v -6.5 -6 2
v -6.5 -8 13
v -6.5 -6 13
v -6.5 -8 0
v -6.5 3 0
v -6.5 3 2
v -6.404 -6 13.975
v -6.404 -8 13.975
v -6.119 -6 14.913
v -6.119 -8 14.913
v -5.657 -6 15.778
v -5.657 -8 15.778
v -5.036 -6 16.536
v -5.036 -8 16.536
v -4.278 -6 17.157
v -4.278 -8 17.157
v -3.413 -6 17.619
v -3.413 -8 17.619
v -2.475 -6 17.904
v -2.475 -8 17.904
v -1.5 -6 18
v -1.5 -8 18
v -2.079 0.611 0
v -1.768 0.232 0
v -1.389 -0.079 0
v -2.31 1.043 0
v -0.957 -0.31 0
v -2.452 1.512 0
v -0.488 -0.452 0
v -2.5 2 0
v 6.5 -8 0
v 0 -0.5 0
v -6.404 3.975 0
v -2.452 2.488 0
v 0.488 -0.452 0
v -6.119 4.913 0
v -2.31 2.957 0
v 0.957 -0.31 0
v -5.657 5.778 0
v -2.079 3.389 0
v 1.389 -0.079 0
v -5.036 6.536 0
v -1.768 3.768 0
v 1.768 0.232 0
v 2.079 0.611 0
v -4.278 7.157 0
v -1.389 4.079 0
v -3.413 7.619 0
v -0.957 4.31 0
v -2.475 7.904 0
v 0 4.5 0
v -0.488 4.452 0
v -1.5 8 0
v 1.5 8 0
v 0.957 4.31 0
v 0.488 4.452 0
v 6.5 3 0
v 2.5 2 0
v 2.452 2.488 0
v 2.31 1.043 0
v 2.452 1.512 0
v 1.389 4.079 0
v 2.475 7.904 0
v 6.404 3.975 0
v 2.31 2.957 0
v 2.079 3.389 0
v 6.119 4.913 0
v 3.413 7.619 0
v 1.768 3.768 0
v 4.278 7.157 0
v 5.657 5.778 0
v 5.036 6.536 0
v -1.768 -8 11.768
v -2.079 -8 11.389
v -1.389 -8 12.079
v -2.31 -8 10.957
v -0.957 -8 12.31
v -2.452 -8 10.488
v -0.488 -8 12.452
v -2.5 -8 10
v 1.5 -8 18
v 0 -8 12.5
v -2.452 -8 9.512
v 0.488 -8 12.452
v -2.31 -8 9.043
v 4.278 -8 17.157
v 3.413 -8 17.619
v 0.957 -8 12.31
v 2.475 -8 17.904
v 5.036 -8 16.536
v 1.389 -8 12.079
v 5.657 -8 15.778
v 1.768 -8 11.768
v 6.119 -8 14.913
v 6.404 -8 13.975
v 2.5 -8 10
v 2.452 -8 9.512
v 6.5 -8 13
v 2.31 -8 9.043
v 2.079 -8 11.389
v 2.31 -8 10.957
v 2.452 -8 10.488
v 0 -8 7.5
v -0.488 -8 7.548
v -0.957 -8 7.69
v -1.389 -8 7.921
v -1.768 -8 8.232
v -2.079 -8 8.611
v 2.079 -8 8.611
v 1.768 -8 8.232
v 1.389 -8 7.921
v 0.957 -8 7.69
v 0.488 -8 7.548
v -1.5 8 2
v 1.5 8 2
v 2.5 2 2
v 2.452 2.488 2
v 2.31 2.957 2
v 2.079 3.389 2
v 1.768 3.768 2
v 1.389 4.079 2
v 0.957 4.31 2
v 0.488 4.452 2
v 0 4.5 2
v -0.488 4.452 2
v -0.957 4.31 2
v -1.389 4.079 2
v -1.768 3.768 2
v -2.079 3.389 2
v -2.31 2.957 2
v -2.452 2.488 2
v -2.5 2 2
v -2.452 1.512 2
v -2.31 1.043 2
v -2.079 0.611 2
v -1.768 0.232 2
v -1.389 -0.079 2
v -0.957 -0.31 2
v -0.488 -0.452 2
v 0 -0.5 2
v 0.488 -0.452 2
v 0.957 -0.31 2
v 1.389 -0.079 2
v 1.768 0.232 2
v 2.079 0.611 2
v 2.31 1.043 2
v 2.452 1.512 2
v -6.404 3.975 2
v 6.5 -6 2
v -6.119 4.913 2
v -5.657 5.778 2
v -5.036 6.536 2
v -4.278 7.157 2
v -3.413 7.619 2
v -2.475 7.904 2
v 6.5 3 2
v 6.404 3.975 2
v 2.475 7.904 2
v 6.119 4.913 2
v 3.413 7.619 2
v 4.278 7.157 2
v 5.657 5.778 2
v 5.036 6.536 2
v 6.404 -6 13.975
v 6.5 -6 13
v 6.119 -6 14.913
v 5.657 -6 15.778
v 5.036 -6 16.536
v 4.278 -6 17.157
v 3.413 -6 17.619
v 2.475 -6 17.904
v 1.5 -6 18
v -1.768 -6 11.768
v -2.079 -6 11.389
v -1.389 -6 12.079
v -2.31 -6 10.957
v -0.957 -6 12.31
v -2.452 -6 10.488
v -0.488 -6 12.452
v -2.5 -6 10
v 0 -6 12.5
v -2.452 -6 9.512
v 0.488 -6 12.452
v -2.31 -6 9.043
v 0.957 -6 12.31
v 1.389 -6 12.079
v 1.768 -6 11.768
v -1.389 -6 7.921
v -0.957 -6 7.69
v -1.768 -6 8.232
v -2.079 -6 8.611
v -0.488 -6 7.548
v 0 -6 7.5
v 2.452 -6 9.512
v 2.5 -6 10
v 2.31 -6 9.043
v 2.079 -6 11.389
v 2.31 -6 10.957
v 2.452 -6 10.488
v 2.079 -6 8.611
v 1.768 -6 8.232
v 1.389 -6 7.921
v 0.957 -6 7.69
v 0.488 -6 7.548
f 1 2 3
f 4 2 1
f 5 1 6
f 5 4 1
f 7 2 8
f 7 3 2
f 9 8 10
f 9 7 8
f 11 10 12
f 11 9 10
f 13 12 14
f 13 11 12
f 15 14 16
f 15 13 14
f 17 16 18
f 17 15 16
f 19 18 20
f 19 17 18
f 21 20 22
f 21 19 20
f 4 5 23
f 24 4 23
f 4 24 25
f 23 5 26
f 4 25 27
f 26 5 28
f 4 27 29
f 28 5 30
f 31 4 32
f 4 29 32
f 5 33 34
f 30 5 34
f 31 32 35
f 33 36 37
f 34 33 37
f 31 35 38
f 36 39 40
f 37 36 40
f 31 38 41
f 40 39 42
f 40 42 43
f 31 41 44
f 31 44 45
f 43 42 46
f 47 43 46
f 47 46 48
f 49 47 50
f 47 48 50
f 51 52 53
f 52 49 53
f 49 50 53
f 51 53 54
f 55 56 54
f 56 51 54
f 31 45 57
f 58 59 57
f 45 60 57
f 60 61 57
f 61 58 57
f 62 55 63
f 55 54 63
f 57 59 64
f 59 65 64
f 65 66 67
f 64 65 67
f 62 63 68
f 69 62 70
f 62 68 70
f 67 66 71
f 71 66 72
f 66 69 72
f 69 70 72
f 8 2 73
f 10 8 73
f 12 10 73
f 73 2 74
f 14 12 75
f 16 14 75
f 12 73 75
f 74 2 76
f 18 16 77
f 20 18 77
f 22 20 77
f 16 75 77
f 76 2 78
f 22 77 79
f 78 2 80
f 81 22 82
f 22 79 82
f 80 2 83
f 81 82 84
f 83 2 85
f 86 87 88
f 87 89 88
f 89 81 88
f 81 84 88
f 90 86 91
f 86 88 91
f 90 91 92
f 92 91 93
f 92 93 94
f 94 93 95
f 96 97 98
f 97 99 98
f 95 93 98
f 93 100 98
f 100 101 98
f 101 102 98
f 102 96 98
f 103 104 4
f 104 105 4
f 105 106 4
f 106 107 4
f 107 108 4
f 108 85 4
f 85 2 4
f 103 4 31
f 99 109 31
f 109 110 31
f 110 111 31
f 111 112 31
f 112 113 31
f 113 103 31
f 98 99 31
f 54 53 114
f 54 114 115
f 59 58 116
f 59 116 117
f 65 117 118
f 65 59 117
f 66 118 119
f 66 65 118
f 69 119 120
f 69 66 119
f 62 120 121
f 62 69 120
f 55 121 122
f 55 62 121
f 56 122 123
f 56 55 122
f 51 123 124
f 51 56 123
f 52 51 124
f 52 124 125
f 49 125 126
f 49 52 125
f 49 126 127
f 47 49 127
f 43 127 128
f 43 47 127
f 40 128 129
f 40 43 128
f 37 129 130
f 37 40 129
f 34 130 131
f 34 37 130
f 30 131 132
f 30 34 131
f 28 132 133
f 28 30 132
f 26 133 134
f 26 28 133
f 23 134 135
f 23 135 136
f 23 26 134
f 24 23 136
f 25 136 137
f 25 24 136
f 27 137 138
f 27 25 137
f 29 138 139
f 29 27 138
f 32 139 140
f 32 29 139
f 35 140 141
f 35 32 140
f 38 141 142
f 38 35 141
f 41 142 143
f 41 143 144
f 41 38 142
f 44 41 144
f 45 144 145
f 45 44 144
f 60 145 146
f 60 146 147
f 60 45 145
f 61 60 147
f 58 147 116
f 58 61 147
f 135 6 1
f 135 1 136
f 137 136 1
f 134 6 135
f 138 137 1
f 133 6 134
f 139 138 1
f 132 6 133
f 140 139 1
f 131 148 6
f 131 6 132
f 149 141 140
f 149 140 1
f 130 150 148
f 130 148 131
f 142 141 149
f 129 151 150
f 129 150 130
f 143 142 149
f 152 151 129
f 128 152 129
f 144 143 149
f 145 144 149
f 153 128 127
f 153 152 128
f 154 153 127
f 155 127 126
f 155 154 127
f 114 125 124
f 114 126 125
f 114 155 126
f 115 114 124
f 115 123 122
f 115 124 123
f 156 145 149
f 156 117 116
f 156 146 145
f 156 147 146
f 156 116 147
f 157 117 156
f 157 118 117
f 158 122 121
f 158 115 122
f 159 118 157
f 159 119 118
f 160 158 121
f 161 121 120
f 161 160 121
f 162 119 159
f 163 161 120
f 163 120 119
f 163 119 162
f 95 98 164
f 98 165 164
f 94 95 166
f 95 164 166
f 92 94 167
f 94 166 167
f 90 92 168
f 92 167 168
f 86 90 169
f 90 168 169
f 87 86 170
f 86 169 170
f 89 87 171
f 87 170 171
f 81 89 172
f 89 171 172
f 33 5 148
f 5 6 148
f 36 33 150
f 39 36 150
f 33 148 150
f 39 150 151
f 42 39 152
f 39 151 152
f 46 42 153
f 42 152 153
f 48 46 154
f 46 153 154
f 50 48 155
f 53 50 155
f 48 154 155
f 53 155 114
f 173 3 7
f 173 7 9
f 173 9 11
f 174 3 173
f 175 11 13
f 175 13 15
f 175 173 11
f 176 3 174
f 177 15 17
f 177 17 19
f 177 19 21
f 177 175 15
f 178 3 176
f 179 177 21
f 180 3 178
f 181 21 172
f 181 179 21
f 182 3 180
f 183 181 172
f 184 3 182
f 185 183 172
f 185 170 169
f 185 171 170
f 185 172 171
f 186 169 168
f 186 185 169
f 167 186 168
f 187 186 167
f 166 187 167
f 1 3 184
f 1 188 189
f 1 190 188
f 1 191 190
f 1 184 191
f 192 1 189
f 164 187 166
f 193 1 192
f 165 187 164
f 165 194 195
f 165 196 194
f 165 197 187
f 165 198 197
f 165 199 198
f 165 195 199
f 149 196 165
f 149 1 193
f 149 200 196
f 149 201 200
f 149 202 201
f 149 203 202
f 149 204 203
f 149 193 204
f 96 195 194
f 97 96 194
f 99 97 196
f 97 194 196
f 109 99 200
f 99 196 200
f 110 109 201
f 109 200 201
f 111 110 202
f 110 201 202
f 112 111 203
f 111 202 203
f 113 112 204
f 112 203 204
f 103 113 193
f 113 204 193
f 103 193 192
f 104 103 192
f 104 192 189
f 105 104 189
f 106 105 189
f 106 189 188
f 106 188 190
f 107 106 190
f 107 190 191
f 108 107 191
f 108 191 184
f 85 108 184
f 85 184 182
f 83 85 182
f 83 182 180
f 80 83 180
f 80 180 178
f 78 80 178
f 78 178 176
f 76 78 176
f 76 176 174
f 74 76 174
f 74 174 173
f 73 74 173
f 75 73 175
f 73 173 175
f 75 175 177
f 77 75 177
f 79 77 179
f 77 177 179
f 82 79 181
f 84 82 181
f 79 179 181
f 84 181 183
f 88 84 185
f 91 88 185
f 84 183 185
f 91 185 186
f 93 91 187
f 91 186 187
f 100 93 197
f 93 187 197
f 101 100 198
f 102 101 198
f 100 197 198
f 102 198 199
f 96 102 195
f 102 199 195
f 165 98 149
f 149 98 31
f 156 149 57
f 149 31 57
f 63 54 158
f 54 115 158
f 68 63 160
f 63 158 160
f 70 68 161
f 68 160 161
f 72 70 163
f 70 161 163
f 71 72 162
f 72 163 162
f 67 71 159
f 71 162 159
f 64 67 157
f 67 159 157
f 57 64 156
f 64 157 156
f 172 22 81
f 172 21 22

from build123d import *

# Parameters (mm, degrees)
SKETCH1_W           = 13
SKETCH1_H           = 16
SKETCH1_R           = 2.5
BOSS_EXTRUDE1_DEPTH = 2
FILLET1_R           = 5
SKETCH2_W           = 13
SKETCH2_H           = 2
BOSS_EXTRUDE2_DEPTH = 16
FILLET2_R           = 5
SKETCH3_R           = 2.5
CUT_EXTRUDE1_DEPTH  = 16


with BuildPart() as part:
    # Sketch1 → Boss-Extrude1 (new body)
    with BuildSketch(Plane.XY):
        Rectangle(SKETCH1_W, SKETCH1_H)
        with Locations((0, 2)):
            Circle(SKETCH1_R, mode=Mode.SUBTRACT)
    extrude(amount=BOSS_EXTRUDE1_DEPTH)

    # Fillet1
    fillet1_edges = [part.edges().sort_by_distance(p)[0] for p in [
        (-6.5, 8, 1),
        (6.5, 8, 1),
    ]]
    fillet(fillet1_edges, radius=FILLET1_R)

    # Sketch2 → Boss-Extrude2 (add)
    with BuildSketch(Plane.XY.offset(2)):
        with Locations((0, -7)):
            Rectangle(SKETCH2_W, SKETCH2_H)
    extrude(amount=BOSS_EXTRUDE2_DEPTH)

    # Fillet2
    fillet2_edges = [part.edges().sort_by_distance(p)[0] for p in [
        (-6.5, -7, 18),
        (6.5, -7, 18),
    ]]
    fillet(fillet2_edges, radius=FILLET2_R)

    # Sketch3 → Cut-Extrude1 (cut)
    with BuildSketch(Plane(origin=(0, -6, 0), x_dir=(1, 0, 0), z_dir=(0, 1, 0))):
        with Locations((0, -10)):
            Circle(SKETCH3_R)
    extrude(amount=-CUT_EXTRUDE1_DEPTH, mode=Mode.SUBTRACT)


solid = part.part
